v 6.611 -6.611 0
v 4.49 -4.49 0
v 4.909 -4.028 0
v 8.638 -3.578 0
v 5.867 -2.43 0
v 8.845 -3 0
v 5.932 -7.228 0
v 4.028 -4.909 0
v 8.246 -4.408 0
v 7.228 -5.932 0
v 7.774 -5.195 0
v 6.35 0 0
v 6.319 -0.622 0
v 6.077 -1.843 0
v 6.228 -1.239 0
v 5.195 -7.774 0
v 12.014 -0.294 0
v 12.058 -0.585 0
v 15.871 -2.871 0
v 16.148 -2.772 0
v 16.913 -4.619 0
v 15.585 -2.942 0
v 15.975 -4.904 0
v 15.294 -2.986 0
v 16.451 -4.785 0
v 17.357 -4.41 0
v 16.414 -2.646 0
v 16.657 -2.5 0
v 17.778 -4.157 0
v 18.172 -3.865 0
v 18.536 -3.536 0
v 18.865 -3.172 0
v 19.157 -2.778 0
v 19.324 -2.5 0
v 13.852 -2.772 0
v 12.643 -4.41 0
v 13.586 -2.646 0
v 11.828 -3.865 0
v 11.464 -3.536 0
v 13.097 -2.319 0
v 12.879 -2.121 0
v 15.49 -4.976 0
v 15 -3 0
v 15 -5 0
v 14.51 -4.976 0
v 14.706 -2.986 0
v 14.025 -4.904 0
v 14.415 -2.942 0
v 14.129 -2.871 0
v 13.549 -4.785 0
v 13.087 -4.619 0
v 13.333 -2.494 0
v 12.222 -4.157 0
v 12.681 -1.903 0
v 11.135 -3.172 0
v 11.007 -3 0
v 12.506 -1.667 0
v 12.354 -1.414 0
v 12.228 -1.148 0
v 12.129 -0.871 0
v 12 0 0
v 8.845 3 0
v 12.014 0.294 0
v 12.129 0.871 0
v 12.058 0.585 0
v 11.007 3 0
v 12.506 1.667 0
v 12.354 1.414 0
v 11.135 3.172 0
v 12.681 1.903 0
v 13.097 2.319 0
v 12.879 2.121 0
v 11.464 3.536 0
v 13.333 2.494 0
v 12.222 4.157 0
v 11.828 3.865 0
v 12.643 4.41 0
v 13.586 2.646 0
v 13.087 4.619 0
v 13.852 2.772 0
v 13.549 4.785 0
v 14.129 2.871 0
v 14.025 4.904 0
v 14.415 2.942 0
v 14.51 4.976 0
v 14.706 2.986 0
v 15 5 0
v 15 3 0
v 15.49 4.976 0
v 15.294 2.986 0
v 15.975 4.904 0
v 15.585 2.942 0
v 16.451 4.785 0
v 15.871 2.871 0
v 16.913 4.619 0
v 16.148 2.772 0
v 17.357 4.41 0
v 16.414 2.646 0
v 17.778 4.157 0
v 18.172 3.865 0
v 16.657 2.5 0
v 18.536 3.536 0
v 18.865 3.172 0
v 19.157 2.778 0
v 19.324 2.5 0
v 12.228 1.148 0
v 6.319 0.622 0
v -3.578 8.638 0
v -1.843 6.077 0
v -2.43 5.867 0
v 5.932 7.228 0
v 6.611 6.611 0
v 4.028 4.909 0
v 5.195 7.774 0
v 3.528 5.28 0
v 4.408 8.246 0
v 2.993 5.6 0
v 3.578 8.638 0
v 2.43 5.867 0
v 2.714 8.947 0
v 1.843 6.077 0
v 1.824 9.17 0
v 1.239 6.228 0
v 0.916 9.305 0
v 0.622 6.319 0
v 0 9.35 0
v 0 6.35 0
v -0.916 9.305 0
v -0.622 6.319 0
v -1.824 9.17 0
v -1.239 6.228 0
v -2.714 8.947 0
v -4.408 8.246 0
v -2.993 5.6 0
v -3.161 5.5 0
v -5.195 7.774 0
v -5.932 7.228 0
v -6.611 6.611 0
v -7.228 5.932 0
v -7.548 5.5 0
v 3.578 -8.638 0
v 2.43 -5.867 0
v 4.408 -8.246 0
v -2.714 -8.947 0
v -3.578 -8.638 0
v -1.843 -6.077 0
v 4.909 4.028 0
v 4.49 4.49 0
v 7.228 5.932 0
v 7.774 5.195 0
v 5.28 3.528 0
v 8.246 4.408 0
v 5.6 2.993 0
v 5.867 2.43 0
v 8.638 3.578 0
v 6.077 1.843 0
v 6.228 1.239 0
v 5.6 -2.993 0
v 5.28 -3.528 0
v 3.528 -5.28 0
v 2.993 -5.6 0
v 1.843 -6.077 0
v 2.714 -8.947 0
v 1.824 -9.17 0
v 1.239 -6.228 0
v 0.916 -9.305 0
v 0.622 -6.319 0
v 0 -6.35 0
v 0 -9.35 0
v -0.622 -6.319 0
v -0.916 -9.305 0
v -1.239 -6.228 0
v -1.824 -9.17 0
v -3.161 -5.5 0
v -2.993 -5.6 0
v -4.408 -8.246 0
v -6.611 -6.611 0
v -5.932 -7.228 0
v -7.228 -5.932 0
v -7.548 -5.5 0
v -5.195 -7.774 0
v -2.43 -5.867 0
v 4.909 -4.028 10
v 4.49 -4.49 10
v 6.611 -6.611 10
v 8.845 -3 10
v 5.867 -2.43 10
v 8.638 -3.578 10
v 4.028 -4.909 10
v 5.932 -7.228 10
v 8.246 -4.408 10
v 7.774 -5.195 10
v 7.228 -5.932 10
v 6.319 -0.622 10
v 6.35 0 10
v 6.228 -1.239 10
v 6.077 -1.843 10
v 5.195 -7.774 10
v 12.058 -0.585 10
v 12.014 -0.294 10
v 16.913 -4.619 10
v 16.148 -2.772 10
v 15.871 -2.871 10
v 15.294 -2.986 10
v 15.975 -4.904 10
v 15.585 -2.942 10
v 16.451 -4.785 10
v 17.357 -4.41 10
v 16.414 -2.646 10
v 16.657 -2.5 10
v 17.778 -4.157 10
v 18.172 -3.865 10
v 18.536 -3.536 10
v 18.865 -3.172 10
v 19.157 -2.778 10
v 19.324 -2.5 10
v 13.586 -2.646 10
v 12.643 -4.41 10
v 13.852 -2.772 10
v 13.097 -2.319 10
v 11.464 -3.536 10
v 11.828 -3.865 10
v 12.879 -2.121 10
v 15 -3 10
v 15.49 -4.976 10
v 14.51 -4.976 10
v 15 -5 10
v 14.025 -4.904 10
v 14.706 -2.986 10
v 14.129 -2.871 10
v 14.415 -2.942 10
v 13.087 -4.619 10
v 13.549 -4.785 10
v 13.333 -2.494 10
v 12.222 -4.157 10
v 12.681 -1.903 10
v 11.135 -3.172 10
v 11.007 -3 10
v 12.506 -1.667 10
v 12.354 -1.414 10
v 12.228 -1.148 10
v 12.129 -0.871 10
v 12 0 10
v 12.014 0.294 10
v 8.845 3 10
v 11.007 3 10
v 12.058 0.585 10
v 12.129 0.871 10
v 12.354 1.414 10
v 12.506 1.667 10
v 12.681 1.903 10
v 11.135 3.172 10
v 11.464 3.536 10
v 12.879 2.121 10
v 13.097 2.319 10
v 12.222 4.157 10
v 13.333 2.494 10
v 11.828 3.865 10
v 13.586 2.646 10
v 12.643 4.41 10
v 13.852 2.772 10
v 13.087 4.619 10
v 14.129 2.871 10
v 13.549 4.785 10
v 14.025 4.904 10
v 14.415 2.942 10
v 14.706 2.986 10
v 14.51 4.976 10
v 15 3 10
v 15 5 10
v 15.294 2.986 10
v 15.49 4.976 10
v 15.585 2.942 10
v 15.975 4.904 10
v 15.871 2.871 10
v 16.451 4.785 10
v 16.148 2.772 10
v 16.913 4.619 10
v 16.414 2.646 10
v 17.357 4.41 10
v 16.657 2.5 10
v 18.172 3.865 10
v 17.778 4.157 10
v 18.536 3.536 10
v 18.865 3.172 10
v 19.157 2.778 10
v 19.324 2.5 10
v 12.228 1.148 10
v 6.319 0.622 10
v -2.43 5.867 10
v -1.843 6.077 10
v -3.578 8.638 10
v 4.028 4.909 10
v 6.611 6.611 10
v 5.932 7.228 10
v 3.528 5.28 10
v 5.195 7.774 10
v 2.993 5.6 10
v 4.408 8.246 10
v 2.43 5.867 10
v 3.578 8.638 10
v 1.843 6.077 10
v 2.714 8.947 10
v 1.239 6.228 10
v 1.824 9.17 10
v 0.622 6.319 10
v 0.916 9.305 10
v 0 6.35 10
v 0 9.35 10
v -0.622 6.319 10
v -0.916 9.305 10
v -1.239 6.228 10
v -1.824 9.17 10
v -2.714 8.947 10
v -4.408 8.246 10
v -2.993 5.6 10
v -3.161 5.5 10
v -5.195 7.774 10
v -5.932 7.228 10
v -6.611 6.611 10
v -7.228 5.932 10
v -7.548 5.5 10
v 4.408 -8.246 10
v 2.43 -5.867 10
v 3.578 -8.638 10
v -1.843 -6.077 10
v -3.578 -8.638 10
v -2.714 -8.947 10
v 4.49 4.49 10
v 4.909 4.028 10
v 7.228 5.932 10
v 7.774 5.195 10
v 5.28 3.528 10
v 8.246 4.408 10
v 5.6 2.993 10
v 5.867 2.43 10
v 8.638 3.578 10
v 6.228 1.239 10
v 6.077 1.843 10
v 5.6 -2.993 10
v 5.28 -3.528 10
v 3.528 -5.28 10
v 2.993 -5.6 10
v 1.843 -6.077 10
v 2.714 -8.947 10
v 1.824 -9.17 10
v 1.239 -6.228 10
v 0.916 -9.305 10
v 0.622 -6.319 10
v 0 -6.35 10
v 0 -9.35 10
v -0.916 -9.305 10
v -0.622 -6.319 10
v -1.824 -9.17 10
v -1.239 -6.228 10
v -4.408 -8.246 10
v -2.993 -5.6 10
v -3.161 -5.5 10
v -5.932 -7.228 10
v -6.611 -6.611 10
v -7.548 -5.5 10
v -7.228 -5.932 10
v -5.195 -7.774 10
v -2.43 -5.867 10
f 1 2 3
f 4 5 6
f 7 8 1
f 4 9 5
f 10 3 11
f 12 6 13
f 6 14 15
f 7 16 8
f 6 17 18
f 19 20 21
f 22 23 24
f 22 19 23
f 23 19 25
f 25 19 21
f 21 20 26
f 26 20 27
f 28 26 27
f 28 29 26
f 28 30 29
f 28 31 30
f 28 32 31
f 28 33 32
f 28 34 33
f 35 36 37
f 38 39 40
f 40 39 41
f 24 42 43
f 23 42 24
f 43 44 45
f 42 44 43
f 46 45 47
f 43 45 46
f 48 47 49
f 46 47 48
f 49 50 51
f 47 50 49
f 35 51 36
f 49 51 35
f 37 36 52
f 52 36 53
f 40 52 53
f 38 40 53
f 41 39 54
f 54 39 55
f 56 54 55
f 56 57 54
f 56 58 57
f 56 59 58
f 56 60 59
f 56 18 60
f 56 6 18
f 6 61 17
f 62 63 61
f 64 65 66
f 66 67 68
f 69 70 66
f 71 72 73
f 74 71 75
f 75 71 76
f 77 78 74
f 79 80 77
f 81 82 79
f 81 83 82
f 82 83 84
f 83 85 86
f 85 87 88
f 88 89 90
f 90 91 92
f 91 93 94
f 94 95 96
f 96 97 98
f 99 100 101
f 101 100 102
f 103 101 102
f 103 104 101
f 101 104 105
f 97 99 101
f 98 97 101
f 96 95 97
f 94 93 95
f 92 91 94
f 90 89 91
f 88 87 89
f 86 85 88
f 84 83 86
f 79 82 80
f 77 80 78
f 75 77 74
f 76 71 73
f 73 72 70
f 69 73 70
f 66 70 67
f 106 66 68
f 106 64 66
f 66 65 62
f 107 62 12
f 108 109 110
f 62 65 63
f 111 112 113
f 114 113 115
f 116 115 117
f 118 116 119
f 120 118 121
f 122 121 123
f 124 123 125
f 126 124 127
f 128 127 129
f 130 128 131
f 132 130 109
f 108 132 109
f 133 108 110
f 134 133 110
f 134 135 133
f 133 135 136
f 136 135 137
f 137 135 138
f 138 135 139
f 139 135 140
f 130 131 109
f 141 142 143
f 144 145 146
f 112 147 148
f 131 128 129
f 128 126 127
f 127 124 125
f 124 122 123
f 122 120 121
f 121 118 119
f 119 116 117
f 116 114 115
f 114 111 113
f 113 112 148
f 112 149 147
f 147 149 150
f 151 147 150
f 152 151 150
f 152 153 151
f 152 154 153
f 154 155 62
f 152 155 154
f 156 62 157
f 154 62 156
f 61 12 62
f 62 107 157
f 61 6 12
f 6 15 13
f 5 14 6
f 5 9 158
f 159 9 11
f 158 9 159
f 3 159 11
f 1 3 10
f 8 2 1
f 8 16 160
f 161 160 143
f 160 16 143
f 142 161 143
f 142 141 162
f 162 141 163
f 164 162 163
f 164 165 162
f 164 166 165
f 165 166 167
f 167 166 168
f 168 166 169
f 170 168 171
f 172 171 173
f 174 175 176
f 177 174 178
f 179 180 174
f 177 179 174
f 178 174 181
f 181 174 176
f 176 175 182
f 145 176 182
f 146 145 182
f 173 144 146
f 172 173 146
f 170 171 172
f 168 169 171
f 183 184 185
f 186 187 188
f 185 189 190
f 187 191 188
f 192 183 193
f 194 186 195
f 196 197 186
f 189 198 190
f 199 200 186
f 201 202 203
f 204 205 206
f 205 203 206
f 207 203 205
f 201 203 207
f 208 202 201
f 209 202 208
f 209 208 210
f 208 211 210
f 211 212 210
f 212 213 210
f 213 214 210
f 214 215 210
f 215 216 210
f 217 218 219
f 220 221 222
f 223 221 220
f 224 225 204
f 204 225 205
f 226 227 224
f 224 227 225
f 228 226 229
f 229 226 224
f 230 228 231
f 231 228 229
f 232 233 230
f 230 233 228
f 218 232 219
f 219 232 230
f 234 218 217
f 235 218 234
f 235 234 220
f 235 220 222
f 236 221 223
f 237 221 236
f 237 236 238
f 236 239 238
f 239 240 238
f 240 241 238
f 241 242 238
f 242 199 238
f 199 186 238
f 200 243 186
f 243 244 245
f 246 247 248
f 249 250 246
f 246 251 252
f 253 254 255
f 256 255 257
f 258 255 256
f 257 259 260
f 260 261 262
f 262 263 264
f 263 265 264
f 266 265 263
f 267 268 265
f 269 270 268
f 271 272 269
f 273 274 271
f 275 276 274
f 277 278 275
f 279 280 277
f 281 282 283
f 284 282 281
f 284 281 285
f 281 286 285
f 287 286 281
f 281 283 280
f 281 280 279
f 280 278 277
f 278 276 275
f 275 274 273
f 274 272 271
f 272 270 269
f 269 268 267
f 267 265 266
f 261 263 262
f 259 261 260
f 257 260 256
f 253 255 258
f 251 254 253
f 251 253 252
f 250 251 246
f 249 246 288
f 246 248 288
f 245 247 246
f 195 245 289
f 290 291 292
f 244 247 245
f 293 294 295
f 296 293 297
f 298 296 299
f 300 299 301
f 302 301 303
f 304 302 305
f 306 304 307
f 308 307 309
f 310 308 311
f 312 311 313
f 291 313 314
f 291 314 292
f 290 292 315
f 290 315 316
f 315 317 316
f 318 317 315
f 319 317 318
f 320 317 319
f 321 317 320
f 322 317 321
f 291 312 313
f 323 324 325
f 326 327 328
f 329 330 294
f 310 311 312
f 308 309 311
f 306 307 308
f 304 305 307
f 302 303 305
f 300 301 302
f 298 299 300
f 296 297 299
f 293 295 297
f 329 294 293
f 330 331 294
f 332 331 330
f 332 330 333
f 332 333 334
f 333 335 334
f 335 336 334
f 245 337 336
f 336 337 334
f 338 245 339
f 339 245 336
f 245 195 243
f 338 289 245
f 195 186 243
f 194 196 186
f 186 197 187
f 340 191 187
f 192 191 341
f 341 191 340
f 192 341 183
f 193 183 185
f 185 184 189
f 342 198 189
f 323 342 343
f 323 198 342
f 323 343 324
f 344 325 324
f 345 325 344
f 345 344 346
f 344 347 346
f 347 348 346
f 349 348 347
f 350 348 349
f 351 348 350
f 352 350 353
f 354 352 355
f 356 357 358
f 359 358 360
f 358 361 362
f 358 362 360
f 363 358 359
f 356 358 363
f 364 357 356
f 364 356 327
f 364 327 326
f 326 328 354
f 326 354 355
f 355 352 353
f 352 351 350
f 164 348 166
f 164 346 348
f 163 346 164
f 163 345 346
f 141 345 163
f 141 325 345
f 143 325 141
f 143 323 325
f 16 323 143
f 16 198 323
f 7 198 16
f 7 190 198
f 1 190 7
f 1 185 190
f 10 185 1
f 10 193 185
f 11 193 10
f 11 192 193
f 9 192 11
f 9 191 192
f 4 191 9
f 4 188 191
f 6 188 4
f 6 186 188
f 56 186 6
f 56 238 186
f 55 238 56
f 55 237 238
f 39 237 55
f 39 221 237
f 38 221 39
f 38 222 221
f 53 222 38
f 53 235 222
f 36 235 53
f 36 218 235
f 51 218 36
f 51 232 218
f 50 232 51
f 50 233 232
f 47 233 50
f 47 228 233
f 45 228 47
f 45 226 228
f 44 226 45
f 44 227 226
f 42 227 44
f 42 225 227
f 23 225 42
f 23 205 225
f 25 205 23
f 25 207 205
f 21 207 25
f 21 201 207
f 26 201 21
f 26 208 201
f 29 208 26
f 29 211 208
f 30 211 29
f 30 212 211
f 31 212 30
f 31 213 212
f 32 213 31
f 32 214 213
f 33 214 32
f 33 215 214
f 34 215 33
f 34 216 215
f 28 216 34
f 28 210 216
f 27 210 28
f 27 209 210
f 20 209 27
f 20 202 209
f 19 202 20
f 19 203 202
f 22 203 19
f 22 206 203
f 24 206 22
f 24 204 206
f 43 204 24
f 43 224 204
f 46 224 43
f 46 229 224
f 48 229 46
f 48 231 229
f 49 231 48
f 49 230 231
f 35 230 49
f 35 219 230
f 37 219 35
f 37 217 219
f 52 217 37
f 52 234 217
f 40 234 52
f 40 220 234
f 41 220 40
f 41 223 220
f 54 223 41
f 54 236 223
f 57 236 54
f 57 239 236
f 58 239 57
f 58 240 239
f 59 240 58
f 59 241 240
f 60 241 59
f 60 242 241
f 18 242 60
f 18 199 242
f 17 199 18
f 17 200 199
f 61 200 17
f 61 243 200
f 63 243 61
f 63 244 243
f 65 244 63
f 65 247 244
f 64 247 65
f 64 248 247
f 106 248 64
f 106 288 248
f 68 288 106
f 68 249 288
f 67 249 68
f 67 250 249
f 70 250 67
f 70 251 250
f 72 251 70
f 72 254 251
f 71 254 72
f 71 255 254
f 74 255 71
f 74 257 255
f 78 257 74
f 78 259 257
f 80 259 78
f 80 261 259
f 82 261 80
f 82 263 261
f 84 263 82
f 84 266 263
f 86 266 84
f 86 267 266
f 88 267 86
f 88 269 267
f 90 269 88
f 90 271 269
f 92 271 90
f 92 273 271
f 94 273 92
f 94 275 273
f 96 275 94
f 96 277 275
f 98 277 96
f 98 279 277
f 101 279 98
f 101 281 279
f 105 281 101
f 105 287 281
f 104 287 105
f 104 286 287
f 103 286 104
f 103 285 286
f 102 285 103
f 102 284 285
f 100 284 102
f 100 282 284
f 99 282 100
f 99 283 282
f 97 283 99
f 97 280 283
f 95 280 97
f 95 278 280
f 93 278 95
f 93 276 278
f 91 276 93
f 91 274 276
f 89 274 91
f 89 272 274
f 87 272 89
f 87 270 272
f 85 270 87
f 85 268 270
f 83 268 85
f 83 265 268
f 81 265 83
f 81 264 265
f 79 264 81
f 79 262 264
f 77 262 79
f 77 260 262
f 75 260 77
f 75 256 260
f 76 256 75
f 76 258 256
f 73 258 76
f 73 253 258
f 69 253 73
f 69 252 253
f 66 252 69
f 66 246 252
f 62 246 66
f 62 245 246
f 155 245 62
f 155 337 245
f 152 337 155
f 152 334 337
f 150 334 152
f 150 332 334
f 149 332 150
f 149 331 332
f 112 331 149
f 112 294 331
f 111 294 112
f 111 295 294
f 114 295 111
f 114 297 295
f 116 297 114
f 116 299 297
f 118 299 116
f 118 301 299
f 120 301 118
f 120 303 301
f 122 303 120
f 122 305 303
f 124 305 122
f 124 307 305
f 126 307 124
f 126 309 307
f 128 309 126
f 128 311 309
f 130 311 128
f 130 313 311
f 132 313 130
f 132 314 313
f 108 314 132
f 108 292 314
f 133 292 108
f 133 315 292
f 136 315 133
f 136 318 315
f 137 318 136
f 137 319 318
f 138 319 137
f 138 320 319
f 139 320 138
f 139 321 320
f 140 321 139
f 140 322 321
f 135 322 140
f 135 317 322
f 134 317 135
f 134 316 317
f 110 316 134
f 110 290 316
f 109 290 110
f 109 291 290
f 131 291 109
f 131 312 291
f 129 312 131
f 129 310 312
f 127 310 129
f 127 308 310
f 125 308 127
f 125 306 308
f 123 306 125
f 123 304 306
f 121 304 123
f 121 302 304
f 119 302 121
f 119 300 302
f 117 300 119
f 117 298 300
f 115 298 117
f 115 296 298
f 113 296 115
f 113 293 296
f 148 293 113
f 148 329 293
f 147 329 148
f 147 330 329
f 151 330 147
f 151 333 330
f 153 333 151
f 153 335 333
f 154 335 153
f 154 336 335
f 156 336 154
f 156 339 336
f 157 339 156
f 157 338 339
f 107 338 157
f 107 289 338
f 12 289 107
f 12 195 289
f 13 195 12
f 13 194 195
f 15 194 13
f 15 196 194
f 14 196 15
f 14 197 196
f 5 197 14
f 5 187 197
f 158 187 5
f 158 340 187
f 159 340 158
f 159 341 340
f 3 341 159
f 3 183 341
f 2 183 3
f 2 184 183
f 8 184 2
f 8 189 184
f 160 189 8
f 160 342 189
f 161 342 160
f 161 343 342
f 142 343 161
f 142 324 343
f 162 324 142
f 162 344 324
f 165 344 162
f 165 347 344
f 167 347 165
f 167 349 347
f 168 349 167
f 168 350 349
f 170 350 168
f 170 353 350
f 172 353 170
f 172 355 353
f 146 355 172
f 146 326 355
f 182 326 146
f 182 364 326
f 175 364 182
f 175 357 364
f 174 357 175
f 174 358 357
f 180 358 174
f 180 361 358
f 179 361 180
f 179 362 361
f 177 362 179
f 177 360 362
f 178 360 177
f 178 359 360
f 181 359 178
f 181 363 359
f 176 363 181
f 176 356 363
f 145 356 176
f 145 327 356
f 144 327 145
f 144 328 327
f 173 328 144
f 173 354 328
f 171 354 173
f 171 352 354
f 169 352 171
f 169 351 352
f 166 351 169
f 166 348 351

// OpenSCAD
// --- Parameters (Dimensions in mm) ---

// Rod Ring (Inner diameter 12.7mm, Wall 3mm)
rod_inner_dia = 12.7;
rod_wall = 3.0;
rod_outer_dia = rod_inner_dia + (2 * rod_wall); // 18.7mm

// Rod Ring Cutout (10mm wide, 10mm tall, centered on -X side)
// Specification: "10 mm wide opening cut out of its -X side (everything with x < 0 and -5 < y < 5 is removed)"
// This means the cutout spans from x = -5 to x = 0.
rod_cutout_width = 5.0; 
rod_cutout_height = 10.0;

// Tubing Ring (Inner diameter 6mm, Wall 2mm)
tube_inner_dia = 6.0;
tube_wall = 2.0;
tube_outer_dia = tube_inner_dia + (2 * tube_wall); // 10.0mm
tube_offset_x = 15.0;

// Tubing Ring Cutout (4.5mm wide, centered on +X side)
// Specification: "4.5 mm wide opening cut out of its +X side (x > 15 and -2.25 < y < 2.25)"
// This means the cutout spans from x = 15 to x = 19.5.
tube_cutout_width = 4.5;
tube_cutout_height = 4.5;

// Bridge (6mm wide in Y, between x=8 and x=12)
bridge_x_start = 8.0;
bridge_x_end = 12.0;
bridge_y_width = 6.0;

// Extrusion Height
extrusion_z = 10.0;

// Resolution
$fn = 64;

// --- Modeling ---

// We define the 2D profile first to avoid mixing 2D and 3D objects.
module profile_2d() {
    difference() {
        union() {
            // 1. Rod Ring Profile
            difference() {
                circle(d = rod_outer_dia);
                circle(d = rod_inner_dia);
            }
            
            // 2. Tubing Ring Profile
            translate([tube_offset_x, 0])
            difference() {
                circle(d = tube_outer_dia);
                circle(d = tube_inner_dia);
            }
            
            // 3. Solid Bridge Profile
            // The bridge is 6mm wide in Y, centered at Y=0.
            // It spans from x=8 to x=12.
            translate([(bridge_x_start + bridge_x_end)/2, 0])
                square([bridge_x_end - bridge_x_start, bridge_y_width], center = true);
        }

        // Subtract Rod Cutout: x < 0 and -5 < y < 5
        // To ensure a clean cut through the ring wall, we extend the subtraction.
        // The ring outer radius is 9.35. We cut from x = -10 to x = 0.
        translate([-5, 0])
            square([10, 11], center = true);

        // Subtract Tubing Cutout: x > 15 and -2.25 < y < 2.25
        // The tube outer radius is 5. The tube center is at x=15.
        // The outer edge is at x=20. We cut from x = 15 to x = 21.
        translate([18, 0])
            square([7, 5], center = true);
    }
}

// Final 3D Object: Extrude the 2D profile
linear_extrude(height = extrusion_z) {
    profile_2d();
}
